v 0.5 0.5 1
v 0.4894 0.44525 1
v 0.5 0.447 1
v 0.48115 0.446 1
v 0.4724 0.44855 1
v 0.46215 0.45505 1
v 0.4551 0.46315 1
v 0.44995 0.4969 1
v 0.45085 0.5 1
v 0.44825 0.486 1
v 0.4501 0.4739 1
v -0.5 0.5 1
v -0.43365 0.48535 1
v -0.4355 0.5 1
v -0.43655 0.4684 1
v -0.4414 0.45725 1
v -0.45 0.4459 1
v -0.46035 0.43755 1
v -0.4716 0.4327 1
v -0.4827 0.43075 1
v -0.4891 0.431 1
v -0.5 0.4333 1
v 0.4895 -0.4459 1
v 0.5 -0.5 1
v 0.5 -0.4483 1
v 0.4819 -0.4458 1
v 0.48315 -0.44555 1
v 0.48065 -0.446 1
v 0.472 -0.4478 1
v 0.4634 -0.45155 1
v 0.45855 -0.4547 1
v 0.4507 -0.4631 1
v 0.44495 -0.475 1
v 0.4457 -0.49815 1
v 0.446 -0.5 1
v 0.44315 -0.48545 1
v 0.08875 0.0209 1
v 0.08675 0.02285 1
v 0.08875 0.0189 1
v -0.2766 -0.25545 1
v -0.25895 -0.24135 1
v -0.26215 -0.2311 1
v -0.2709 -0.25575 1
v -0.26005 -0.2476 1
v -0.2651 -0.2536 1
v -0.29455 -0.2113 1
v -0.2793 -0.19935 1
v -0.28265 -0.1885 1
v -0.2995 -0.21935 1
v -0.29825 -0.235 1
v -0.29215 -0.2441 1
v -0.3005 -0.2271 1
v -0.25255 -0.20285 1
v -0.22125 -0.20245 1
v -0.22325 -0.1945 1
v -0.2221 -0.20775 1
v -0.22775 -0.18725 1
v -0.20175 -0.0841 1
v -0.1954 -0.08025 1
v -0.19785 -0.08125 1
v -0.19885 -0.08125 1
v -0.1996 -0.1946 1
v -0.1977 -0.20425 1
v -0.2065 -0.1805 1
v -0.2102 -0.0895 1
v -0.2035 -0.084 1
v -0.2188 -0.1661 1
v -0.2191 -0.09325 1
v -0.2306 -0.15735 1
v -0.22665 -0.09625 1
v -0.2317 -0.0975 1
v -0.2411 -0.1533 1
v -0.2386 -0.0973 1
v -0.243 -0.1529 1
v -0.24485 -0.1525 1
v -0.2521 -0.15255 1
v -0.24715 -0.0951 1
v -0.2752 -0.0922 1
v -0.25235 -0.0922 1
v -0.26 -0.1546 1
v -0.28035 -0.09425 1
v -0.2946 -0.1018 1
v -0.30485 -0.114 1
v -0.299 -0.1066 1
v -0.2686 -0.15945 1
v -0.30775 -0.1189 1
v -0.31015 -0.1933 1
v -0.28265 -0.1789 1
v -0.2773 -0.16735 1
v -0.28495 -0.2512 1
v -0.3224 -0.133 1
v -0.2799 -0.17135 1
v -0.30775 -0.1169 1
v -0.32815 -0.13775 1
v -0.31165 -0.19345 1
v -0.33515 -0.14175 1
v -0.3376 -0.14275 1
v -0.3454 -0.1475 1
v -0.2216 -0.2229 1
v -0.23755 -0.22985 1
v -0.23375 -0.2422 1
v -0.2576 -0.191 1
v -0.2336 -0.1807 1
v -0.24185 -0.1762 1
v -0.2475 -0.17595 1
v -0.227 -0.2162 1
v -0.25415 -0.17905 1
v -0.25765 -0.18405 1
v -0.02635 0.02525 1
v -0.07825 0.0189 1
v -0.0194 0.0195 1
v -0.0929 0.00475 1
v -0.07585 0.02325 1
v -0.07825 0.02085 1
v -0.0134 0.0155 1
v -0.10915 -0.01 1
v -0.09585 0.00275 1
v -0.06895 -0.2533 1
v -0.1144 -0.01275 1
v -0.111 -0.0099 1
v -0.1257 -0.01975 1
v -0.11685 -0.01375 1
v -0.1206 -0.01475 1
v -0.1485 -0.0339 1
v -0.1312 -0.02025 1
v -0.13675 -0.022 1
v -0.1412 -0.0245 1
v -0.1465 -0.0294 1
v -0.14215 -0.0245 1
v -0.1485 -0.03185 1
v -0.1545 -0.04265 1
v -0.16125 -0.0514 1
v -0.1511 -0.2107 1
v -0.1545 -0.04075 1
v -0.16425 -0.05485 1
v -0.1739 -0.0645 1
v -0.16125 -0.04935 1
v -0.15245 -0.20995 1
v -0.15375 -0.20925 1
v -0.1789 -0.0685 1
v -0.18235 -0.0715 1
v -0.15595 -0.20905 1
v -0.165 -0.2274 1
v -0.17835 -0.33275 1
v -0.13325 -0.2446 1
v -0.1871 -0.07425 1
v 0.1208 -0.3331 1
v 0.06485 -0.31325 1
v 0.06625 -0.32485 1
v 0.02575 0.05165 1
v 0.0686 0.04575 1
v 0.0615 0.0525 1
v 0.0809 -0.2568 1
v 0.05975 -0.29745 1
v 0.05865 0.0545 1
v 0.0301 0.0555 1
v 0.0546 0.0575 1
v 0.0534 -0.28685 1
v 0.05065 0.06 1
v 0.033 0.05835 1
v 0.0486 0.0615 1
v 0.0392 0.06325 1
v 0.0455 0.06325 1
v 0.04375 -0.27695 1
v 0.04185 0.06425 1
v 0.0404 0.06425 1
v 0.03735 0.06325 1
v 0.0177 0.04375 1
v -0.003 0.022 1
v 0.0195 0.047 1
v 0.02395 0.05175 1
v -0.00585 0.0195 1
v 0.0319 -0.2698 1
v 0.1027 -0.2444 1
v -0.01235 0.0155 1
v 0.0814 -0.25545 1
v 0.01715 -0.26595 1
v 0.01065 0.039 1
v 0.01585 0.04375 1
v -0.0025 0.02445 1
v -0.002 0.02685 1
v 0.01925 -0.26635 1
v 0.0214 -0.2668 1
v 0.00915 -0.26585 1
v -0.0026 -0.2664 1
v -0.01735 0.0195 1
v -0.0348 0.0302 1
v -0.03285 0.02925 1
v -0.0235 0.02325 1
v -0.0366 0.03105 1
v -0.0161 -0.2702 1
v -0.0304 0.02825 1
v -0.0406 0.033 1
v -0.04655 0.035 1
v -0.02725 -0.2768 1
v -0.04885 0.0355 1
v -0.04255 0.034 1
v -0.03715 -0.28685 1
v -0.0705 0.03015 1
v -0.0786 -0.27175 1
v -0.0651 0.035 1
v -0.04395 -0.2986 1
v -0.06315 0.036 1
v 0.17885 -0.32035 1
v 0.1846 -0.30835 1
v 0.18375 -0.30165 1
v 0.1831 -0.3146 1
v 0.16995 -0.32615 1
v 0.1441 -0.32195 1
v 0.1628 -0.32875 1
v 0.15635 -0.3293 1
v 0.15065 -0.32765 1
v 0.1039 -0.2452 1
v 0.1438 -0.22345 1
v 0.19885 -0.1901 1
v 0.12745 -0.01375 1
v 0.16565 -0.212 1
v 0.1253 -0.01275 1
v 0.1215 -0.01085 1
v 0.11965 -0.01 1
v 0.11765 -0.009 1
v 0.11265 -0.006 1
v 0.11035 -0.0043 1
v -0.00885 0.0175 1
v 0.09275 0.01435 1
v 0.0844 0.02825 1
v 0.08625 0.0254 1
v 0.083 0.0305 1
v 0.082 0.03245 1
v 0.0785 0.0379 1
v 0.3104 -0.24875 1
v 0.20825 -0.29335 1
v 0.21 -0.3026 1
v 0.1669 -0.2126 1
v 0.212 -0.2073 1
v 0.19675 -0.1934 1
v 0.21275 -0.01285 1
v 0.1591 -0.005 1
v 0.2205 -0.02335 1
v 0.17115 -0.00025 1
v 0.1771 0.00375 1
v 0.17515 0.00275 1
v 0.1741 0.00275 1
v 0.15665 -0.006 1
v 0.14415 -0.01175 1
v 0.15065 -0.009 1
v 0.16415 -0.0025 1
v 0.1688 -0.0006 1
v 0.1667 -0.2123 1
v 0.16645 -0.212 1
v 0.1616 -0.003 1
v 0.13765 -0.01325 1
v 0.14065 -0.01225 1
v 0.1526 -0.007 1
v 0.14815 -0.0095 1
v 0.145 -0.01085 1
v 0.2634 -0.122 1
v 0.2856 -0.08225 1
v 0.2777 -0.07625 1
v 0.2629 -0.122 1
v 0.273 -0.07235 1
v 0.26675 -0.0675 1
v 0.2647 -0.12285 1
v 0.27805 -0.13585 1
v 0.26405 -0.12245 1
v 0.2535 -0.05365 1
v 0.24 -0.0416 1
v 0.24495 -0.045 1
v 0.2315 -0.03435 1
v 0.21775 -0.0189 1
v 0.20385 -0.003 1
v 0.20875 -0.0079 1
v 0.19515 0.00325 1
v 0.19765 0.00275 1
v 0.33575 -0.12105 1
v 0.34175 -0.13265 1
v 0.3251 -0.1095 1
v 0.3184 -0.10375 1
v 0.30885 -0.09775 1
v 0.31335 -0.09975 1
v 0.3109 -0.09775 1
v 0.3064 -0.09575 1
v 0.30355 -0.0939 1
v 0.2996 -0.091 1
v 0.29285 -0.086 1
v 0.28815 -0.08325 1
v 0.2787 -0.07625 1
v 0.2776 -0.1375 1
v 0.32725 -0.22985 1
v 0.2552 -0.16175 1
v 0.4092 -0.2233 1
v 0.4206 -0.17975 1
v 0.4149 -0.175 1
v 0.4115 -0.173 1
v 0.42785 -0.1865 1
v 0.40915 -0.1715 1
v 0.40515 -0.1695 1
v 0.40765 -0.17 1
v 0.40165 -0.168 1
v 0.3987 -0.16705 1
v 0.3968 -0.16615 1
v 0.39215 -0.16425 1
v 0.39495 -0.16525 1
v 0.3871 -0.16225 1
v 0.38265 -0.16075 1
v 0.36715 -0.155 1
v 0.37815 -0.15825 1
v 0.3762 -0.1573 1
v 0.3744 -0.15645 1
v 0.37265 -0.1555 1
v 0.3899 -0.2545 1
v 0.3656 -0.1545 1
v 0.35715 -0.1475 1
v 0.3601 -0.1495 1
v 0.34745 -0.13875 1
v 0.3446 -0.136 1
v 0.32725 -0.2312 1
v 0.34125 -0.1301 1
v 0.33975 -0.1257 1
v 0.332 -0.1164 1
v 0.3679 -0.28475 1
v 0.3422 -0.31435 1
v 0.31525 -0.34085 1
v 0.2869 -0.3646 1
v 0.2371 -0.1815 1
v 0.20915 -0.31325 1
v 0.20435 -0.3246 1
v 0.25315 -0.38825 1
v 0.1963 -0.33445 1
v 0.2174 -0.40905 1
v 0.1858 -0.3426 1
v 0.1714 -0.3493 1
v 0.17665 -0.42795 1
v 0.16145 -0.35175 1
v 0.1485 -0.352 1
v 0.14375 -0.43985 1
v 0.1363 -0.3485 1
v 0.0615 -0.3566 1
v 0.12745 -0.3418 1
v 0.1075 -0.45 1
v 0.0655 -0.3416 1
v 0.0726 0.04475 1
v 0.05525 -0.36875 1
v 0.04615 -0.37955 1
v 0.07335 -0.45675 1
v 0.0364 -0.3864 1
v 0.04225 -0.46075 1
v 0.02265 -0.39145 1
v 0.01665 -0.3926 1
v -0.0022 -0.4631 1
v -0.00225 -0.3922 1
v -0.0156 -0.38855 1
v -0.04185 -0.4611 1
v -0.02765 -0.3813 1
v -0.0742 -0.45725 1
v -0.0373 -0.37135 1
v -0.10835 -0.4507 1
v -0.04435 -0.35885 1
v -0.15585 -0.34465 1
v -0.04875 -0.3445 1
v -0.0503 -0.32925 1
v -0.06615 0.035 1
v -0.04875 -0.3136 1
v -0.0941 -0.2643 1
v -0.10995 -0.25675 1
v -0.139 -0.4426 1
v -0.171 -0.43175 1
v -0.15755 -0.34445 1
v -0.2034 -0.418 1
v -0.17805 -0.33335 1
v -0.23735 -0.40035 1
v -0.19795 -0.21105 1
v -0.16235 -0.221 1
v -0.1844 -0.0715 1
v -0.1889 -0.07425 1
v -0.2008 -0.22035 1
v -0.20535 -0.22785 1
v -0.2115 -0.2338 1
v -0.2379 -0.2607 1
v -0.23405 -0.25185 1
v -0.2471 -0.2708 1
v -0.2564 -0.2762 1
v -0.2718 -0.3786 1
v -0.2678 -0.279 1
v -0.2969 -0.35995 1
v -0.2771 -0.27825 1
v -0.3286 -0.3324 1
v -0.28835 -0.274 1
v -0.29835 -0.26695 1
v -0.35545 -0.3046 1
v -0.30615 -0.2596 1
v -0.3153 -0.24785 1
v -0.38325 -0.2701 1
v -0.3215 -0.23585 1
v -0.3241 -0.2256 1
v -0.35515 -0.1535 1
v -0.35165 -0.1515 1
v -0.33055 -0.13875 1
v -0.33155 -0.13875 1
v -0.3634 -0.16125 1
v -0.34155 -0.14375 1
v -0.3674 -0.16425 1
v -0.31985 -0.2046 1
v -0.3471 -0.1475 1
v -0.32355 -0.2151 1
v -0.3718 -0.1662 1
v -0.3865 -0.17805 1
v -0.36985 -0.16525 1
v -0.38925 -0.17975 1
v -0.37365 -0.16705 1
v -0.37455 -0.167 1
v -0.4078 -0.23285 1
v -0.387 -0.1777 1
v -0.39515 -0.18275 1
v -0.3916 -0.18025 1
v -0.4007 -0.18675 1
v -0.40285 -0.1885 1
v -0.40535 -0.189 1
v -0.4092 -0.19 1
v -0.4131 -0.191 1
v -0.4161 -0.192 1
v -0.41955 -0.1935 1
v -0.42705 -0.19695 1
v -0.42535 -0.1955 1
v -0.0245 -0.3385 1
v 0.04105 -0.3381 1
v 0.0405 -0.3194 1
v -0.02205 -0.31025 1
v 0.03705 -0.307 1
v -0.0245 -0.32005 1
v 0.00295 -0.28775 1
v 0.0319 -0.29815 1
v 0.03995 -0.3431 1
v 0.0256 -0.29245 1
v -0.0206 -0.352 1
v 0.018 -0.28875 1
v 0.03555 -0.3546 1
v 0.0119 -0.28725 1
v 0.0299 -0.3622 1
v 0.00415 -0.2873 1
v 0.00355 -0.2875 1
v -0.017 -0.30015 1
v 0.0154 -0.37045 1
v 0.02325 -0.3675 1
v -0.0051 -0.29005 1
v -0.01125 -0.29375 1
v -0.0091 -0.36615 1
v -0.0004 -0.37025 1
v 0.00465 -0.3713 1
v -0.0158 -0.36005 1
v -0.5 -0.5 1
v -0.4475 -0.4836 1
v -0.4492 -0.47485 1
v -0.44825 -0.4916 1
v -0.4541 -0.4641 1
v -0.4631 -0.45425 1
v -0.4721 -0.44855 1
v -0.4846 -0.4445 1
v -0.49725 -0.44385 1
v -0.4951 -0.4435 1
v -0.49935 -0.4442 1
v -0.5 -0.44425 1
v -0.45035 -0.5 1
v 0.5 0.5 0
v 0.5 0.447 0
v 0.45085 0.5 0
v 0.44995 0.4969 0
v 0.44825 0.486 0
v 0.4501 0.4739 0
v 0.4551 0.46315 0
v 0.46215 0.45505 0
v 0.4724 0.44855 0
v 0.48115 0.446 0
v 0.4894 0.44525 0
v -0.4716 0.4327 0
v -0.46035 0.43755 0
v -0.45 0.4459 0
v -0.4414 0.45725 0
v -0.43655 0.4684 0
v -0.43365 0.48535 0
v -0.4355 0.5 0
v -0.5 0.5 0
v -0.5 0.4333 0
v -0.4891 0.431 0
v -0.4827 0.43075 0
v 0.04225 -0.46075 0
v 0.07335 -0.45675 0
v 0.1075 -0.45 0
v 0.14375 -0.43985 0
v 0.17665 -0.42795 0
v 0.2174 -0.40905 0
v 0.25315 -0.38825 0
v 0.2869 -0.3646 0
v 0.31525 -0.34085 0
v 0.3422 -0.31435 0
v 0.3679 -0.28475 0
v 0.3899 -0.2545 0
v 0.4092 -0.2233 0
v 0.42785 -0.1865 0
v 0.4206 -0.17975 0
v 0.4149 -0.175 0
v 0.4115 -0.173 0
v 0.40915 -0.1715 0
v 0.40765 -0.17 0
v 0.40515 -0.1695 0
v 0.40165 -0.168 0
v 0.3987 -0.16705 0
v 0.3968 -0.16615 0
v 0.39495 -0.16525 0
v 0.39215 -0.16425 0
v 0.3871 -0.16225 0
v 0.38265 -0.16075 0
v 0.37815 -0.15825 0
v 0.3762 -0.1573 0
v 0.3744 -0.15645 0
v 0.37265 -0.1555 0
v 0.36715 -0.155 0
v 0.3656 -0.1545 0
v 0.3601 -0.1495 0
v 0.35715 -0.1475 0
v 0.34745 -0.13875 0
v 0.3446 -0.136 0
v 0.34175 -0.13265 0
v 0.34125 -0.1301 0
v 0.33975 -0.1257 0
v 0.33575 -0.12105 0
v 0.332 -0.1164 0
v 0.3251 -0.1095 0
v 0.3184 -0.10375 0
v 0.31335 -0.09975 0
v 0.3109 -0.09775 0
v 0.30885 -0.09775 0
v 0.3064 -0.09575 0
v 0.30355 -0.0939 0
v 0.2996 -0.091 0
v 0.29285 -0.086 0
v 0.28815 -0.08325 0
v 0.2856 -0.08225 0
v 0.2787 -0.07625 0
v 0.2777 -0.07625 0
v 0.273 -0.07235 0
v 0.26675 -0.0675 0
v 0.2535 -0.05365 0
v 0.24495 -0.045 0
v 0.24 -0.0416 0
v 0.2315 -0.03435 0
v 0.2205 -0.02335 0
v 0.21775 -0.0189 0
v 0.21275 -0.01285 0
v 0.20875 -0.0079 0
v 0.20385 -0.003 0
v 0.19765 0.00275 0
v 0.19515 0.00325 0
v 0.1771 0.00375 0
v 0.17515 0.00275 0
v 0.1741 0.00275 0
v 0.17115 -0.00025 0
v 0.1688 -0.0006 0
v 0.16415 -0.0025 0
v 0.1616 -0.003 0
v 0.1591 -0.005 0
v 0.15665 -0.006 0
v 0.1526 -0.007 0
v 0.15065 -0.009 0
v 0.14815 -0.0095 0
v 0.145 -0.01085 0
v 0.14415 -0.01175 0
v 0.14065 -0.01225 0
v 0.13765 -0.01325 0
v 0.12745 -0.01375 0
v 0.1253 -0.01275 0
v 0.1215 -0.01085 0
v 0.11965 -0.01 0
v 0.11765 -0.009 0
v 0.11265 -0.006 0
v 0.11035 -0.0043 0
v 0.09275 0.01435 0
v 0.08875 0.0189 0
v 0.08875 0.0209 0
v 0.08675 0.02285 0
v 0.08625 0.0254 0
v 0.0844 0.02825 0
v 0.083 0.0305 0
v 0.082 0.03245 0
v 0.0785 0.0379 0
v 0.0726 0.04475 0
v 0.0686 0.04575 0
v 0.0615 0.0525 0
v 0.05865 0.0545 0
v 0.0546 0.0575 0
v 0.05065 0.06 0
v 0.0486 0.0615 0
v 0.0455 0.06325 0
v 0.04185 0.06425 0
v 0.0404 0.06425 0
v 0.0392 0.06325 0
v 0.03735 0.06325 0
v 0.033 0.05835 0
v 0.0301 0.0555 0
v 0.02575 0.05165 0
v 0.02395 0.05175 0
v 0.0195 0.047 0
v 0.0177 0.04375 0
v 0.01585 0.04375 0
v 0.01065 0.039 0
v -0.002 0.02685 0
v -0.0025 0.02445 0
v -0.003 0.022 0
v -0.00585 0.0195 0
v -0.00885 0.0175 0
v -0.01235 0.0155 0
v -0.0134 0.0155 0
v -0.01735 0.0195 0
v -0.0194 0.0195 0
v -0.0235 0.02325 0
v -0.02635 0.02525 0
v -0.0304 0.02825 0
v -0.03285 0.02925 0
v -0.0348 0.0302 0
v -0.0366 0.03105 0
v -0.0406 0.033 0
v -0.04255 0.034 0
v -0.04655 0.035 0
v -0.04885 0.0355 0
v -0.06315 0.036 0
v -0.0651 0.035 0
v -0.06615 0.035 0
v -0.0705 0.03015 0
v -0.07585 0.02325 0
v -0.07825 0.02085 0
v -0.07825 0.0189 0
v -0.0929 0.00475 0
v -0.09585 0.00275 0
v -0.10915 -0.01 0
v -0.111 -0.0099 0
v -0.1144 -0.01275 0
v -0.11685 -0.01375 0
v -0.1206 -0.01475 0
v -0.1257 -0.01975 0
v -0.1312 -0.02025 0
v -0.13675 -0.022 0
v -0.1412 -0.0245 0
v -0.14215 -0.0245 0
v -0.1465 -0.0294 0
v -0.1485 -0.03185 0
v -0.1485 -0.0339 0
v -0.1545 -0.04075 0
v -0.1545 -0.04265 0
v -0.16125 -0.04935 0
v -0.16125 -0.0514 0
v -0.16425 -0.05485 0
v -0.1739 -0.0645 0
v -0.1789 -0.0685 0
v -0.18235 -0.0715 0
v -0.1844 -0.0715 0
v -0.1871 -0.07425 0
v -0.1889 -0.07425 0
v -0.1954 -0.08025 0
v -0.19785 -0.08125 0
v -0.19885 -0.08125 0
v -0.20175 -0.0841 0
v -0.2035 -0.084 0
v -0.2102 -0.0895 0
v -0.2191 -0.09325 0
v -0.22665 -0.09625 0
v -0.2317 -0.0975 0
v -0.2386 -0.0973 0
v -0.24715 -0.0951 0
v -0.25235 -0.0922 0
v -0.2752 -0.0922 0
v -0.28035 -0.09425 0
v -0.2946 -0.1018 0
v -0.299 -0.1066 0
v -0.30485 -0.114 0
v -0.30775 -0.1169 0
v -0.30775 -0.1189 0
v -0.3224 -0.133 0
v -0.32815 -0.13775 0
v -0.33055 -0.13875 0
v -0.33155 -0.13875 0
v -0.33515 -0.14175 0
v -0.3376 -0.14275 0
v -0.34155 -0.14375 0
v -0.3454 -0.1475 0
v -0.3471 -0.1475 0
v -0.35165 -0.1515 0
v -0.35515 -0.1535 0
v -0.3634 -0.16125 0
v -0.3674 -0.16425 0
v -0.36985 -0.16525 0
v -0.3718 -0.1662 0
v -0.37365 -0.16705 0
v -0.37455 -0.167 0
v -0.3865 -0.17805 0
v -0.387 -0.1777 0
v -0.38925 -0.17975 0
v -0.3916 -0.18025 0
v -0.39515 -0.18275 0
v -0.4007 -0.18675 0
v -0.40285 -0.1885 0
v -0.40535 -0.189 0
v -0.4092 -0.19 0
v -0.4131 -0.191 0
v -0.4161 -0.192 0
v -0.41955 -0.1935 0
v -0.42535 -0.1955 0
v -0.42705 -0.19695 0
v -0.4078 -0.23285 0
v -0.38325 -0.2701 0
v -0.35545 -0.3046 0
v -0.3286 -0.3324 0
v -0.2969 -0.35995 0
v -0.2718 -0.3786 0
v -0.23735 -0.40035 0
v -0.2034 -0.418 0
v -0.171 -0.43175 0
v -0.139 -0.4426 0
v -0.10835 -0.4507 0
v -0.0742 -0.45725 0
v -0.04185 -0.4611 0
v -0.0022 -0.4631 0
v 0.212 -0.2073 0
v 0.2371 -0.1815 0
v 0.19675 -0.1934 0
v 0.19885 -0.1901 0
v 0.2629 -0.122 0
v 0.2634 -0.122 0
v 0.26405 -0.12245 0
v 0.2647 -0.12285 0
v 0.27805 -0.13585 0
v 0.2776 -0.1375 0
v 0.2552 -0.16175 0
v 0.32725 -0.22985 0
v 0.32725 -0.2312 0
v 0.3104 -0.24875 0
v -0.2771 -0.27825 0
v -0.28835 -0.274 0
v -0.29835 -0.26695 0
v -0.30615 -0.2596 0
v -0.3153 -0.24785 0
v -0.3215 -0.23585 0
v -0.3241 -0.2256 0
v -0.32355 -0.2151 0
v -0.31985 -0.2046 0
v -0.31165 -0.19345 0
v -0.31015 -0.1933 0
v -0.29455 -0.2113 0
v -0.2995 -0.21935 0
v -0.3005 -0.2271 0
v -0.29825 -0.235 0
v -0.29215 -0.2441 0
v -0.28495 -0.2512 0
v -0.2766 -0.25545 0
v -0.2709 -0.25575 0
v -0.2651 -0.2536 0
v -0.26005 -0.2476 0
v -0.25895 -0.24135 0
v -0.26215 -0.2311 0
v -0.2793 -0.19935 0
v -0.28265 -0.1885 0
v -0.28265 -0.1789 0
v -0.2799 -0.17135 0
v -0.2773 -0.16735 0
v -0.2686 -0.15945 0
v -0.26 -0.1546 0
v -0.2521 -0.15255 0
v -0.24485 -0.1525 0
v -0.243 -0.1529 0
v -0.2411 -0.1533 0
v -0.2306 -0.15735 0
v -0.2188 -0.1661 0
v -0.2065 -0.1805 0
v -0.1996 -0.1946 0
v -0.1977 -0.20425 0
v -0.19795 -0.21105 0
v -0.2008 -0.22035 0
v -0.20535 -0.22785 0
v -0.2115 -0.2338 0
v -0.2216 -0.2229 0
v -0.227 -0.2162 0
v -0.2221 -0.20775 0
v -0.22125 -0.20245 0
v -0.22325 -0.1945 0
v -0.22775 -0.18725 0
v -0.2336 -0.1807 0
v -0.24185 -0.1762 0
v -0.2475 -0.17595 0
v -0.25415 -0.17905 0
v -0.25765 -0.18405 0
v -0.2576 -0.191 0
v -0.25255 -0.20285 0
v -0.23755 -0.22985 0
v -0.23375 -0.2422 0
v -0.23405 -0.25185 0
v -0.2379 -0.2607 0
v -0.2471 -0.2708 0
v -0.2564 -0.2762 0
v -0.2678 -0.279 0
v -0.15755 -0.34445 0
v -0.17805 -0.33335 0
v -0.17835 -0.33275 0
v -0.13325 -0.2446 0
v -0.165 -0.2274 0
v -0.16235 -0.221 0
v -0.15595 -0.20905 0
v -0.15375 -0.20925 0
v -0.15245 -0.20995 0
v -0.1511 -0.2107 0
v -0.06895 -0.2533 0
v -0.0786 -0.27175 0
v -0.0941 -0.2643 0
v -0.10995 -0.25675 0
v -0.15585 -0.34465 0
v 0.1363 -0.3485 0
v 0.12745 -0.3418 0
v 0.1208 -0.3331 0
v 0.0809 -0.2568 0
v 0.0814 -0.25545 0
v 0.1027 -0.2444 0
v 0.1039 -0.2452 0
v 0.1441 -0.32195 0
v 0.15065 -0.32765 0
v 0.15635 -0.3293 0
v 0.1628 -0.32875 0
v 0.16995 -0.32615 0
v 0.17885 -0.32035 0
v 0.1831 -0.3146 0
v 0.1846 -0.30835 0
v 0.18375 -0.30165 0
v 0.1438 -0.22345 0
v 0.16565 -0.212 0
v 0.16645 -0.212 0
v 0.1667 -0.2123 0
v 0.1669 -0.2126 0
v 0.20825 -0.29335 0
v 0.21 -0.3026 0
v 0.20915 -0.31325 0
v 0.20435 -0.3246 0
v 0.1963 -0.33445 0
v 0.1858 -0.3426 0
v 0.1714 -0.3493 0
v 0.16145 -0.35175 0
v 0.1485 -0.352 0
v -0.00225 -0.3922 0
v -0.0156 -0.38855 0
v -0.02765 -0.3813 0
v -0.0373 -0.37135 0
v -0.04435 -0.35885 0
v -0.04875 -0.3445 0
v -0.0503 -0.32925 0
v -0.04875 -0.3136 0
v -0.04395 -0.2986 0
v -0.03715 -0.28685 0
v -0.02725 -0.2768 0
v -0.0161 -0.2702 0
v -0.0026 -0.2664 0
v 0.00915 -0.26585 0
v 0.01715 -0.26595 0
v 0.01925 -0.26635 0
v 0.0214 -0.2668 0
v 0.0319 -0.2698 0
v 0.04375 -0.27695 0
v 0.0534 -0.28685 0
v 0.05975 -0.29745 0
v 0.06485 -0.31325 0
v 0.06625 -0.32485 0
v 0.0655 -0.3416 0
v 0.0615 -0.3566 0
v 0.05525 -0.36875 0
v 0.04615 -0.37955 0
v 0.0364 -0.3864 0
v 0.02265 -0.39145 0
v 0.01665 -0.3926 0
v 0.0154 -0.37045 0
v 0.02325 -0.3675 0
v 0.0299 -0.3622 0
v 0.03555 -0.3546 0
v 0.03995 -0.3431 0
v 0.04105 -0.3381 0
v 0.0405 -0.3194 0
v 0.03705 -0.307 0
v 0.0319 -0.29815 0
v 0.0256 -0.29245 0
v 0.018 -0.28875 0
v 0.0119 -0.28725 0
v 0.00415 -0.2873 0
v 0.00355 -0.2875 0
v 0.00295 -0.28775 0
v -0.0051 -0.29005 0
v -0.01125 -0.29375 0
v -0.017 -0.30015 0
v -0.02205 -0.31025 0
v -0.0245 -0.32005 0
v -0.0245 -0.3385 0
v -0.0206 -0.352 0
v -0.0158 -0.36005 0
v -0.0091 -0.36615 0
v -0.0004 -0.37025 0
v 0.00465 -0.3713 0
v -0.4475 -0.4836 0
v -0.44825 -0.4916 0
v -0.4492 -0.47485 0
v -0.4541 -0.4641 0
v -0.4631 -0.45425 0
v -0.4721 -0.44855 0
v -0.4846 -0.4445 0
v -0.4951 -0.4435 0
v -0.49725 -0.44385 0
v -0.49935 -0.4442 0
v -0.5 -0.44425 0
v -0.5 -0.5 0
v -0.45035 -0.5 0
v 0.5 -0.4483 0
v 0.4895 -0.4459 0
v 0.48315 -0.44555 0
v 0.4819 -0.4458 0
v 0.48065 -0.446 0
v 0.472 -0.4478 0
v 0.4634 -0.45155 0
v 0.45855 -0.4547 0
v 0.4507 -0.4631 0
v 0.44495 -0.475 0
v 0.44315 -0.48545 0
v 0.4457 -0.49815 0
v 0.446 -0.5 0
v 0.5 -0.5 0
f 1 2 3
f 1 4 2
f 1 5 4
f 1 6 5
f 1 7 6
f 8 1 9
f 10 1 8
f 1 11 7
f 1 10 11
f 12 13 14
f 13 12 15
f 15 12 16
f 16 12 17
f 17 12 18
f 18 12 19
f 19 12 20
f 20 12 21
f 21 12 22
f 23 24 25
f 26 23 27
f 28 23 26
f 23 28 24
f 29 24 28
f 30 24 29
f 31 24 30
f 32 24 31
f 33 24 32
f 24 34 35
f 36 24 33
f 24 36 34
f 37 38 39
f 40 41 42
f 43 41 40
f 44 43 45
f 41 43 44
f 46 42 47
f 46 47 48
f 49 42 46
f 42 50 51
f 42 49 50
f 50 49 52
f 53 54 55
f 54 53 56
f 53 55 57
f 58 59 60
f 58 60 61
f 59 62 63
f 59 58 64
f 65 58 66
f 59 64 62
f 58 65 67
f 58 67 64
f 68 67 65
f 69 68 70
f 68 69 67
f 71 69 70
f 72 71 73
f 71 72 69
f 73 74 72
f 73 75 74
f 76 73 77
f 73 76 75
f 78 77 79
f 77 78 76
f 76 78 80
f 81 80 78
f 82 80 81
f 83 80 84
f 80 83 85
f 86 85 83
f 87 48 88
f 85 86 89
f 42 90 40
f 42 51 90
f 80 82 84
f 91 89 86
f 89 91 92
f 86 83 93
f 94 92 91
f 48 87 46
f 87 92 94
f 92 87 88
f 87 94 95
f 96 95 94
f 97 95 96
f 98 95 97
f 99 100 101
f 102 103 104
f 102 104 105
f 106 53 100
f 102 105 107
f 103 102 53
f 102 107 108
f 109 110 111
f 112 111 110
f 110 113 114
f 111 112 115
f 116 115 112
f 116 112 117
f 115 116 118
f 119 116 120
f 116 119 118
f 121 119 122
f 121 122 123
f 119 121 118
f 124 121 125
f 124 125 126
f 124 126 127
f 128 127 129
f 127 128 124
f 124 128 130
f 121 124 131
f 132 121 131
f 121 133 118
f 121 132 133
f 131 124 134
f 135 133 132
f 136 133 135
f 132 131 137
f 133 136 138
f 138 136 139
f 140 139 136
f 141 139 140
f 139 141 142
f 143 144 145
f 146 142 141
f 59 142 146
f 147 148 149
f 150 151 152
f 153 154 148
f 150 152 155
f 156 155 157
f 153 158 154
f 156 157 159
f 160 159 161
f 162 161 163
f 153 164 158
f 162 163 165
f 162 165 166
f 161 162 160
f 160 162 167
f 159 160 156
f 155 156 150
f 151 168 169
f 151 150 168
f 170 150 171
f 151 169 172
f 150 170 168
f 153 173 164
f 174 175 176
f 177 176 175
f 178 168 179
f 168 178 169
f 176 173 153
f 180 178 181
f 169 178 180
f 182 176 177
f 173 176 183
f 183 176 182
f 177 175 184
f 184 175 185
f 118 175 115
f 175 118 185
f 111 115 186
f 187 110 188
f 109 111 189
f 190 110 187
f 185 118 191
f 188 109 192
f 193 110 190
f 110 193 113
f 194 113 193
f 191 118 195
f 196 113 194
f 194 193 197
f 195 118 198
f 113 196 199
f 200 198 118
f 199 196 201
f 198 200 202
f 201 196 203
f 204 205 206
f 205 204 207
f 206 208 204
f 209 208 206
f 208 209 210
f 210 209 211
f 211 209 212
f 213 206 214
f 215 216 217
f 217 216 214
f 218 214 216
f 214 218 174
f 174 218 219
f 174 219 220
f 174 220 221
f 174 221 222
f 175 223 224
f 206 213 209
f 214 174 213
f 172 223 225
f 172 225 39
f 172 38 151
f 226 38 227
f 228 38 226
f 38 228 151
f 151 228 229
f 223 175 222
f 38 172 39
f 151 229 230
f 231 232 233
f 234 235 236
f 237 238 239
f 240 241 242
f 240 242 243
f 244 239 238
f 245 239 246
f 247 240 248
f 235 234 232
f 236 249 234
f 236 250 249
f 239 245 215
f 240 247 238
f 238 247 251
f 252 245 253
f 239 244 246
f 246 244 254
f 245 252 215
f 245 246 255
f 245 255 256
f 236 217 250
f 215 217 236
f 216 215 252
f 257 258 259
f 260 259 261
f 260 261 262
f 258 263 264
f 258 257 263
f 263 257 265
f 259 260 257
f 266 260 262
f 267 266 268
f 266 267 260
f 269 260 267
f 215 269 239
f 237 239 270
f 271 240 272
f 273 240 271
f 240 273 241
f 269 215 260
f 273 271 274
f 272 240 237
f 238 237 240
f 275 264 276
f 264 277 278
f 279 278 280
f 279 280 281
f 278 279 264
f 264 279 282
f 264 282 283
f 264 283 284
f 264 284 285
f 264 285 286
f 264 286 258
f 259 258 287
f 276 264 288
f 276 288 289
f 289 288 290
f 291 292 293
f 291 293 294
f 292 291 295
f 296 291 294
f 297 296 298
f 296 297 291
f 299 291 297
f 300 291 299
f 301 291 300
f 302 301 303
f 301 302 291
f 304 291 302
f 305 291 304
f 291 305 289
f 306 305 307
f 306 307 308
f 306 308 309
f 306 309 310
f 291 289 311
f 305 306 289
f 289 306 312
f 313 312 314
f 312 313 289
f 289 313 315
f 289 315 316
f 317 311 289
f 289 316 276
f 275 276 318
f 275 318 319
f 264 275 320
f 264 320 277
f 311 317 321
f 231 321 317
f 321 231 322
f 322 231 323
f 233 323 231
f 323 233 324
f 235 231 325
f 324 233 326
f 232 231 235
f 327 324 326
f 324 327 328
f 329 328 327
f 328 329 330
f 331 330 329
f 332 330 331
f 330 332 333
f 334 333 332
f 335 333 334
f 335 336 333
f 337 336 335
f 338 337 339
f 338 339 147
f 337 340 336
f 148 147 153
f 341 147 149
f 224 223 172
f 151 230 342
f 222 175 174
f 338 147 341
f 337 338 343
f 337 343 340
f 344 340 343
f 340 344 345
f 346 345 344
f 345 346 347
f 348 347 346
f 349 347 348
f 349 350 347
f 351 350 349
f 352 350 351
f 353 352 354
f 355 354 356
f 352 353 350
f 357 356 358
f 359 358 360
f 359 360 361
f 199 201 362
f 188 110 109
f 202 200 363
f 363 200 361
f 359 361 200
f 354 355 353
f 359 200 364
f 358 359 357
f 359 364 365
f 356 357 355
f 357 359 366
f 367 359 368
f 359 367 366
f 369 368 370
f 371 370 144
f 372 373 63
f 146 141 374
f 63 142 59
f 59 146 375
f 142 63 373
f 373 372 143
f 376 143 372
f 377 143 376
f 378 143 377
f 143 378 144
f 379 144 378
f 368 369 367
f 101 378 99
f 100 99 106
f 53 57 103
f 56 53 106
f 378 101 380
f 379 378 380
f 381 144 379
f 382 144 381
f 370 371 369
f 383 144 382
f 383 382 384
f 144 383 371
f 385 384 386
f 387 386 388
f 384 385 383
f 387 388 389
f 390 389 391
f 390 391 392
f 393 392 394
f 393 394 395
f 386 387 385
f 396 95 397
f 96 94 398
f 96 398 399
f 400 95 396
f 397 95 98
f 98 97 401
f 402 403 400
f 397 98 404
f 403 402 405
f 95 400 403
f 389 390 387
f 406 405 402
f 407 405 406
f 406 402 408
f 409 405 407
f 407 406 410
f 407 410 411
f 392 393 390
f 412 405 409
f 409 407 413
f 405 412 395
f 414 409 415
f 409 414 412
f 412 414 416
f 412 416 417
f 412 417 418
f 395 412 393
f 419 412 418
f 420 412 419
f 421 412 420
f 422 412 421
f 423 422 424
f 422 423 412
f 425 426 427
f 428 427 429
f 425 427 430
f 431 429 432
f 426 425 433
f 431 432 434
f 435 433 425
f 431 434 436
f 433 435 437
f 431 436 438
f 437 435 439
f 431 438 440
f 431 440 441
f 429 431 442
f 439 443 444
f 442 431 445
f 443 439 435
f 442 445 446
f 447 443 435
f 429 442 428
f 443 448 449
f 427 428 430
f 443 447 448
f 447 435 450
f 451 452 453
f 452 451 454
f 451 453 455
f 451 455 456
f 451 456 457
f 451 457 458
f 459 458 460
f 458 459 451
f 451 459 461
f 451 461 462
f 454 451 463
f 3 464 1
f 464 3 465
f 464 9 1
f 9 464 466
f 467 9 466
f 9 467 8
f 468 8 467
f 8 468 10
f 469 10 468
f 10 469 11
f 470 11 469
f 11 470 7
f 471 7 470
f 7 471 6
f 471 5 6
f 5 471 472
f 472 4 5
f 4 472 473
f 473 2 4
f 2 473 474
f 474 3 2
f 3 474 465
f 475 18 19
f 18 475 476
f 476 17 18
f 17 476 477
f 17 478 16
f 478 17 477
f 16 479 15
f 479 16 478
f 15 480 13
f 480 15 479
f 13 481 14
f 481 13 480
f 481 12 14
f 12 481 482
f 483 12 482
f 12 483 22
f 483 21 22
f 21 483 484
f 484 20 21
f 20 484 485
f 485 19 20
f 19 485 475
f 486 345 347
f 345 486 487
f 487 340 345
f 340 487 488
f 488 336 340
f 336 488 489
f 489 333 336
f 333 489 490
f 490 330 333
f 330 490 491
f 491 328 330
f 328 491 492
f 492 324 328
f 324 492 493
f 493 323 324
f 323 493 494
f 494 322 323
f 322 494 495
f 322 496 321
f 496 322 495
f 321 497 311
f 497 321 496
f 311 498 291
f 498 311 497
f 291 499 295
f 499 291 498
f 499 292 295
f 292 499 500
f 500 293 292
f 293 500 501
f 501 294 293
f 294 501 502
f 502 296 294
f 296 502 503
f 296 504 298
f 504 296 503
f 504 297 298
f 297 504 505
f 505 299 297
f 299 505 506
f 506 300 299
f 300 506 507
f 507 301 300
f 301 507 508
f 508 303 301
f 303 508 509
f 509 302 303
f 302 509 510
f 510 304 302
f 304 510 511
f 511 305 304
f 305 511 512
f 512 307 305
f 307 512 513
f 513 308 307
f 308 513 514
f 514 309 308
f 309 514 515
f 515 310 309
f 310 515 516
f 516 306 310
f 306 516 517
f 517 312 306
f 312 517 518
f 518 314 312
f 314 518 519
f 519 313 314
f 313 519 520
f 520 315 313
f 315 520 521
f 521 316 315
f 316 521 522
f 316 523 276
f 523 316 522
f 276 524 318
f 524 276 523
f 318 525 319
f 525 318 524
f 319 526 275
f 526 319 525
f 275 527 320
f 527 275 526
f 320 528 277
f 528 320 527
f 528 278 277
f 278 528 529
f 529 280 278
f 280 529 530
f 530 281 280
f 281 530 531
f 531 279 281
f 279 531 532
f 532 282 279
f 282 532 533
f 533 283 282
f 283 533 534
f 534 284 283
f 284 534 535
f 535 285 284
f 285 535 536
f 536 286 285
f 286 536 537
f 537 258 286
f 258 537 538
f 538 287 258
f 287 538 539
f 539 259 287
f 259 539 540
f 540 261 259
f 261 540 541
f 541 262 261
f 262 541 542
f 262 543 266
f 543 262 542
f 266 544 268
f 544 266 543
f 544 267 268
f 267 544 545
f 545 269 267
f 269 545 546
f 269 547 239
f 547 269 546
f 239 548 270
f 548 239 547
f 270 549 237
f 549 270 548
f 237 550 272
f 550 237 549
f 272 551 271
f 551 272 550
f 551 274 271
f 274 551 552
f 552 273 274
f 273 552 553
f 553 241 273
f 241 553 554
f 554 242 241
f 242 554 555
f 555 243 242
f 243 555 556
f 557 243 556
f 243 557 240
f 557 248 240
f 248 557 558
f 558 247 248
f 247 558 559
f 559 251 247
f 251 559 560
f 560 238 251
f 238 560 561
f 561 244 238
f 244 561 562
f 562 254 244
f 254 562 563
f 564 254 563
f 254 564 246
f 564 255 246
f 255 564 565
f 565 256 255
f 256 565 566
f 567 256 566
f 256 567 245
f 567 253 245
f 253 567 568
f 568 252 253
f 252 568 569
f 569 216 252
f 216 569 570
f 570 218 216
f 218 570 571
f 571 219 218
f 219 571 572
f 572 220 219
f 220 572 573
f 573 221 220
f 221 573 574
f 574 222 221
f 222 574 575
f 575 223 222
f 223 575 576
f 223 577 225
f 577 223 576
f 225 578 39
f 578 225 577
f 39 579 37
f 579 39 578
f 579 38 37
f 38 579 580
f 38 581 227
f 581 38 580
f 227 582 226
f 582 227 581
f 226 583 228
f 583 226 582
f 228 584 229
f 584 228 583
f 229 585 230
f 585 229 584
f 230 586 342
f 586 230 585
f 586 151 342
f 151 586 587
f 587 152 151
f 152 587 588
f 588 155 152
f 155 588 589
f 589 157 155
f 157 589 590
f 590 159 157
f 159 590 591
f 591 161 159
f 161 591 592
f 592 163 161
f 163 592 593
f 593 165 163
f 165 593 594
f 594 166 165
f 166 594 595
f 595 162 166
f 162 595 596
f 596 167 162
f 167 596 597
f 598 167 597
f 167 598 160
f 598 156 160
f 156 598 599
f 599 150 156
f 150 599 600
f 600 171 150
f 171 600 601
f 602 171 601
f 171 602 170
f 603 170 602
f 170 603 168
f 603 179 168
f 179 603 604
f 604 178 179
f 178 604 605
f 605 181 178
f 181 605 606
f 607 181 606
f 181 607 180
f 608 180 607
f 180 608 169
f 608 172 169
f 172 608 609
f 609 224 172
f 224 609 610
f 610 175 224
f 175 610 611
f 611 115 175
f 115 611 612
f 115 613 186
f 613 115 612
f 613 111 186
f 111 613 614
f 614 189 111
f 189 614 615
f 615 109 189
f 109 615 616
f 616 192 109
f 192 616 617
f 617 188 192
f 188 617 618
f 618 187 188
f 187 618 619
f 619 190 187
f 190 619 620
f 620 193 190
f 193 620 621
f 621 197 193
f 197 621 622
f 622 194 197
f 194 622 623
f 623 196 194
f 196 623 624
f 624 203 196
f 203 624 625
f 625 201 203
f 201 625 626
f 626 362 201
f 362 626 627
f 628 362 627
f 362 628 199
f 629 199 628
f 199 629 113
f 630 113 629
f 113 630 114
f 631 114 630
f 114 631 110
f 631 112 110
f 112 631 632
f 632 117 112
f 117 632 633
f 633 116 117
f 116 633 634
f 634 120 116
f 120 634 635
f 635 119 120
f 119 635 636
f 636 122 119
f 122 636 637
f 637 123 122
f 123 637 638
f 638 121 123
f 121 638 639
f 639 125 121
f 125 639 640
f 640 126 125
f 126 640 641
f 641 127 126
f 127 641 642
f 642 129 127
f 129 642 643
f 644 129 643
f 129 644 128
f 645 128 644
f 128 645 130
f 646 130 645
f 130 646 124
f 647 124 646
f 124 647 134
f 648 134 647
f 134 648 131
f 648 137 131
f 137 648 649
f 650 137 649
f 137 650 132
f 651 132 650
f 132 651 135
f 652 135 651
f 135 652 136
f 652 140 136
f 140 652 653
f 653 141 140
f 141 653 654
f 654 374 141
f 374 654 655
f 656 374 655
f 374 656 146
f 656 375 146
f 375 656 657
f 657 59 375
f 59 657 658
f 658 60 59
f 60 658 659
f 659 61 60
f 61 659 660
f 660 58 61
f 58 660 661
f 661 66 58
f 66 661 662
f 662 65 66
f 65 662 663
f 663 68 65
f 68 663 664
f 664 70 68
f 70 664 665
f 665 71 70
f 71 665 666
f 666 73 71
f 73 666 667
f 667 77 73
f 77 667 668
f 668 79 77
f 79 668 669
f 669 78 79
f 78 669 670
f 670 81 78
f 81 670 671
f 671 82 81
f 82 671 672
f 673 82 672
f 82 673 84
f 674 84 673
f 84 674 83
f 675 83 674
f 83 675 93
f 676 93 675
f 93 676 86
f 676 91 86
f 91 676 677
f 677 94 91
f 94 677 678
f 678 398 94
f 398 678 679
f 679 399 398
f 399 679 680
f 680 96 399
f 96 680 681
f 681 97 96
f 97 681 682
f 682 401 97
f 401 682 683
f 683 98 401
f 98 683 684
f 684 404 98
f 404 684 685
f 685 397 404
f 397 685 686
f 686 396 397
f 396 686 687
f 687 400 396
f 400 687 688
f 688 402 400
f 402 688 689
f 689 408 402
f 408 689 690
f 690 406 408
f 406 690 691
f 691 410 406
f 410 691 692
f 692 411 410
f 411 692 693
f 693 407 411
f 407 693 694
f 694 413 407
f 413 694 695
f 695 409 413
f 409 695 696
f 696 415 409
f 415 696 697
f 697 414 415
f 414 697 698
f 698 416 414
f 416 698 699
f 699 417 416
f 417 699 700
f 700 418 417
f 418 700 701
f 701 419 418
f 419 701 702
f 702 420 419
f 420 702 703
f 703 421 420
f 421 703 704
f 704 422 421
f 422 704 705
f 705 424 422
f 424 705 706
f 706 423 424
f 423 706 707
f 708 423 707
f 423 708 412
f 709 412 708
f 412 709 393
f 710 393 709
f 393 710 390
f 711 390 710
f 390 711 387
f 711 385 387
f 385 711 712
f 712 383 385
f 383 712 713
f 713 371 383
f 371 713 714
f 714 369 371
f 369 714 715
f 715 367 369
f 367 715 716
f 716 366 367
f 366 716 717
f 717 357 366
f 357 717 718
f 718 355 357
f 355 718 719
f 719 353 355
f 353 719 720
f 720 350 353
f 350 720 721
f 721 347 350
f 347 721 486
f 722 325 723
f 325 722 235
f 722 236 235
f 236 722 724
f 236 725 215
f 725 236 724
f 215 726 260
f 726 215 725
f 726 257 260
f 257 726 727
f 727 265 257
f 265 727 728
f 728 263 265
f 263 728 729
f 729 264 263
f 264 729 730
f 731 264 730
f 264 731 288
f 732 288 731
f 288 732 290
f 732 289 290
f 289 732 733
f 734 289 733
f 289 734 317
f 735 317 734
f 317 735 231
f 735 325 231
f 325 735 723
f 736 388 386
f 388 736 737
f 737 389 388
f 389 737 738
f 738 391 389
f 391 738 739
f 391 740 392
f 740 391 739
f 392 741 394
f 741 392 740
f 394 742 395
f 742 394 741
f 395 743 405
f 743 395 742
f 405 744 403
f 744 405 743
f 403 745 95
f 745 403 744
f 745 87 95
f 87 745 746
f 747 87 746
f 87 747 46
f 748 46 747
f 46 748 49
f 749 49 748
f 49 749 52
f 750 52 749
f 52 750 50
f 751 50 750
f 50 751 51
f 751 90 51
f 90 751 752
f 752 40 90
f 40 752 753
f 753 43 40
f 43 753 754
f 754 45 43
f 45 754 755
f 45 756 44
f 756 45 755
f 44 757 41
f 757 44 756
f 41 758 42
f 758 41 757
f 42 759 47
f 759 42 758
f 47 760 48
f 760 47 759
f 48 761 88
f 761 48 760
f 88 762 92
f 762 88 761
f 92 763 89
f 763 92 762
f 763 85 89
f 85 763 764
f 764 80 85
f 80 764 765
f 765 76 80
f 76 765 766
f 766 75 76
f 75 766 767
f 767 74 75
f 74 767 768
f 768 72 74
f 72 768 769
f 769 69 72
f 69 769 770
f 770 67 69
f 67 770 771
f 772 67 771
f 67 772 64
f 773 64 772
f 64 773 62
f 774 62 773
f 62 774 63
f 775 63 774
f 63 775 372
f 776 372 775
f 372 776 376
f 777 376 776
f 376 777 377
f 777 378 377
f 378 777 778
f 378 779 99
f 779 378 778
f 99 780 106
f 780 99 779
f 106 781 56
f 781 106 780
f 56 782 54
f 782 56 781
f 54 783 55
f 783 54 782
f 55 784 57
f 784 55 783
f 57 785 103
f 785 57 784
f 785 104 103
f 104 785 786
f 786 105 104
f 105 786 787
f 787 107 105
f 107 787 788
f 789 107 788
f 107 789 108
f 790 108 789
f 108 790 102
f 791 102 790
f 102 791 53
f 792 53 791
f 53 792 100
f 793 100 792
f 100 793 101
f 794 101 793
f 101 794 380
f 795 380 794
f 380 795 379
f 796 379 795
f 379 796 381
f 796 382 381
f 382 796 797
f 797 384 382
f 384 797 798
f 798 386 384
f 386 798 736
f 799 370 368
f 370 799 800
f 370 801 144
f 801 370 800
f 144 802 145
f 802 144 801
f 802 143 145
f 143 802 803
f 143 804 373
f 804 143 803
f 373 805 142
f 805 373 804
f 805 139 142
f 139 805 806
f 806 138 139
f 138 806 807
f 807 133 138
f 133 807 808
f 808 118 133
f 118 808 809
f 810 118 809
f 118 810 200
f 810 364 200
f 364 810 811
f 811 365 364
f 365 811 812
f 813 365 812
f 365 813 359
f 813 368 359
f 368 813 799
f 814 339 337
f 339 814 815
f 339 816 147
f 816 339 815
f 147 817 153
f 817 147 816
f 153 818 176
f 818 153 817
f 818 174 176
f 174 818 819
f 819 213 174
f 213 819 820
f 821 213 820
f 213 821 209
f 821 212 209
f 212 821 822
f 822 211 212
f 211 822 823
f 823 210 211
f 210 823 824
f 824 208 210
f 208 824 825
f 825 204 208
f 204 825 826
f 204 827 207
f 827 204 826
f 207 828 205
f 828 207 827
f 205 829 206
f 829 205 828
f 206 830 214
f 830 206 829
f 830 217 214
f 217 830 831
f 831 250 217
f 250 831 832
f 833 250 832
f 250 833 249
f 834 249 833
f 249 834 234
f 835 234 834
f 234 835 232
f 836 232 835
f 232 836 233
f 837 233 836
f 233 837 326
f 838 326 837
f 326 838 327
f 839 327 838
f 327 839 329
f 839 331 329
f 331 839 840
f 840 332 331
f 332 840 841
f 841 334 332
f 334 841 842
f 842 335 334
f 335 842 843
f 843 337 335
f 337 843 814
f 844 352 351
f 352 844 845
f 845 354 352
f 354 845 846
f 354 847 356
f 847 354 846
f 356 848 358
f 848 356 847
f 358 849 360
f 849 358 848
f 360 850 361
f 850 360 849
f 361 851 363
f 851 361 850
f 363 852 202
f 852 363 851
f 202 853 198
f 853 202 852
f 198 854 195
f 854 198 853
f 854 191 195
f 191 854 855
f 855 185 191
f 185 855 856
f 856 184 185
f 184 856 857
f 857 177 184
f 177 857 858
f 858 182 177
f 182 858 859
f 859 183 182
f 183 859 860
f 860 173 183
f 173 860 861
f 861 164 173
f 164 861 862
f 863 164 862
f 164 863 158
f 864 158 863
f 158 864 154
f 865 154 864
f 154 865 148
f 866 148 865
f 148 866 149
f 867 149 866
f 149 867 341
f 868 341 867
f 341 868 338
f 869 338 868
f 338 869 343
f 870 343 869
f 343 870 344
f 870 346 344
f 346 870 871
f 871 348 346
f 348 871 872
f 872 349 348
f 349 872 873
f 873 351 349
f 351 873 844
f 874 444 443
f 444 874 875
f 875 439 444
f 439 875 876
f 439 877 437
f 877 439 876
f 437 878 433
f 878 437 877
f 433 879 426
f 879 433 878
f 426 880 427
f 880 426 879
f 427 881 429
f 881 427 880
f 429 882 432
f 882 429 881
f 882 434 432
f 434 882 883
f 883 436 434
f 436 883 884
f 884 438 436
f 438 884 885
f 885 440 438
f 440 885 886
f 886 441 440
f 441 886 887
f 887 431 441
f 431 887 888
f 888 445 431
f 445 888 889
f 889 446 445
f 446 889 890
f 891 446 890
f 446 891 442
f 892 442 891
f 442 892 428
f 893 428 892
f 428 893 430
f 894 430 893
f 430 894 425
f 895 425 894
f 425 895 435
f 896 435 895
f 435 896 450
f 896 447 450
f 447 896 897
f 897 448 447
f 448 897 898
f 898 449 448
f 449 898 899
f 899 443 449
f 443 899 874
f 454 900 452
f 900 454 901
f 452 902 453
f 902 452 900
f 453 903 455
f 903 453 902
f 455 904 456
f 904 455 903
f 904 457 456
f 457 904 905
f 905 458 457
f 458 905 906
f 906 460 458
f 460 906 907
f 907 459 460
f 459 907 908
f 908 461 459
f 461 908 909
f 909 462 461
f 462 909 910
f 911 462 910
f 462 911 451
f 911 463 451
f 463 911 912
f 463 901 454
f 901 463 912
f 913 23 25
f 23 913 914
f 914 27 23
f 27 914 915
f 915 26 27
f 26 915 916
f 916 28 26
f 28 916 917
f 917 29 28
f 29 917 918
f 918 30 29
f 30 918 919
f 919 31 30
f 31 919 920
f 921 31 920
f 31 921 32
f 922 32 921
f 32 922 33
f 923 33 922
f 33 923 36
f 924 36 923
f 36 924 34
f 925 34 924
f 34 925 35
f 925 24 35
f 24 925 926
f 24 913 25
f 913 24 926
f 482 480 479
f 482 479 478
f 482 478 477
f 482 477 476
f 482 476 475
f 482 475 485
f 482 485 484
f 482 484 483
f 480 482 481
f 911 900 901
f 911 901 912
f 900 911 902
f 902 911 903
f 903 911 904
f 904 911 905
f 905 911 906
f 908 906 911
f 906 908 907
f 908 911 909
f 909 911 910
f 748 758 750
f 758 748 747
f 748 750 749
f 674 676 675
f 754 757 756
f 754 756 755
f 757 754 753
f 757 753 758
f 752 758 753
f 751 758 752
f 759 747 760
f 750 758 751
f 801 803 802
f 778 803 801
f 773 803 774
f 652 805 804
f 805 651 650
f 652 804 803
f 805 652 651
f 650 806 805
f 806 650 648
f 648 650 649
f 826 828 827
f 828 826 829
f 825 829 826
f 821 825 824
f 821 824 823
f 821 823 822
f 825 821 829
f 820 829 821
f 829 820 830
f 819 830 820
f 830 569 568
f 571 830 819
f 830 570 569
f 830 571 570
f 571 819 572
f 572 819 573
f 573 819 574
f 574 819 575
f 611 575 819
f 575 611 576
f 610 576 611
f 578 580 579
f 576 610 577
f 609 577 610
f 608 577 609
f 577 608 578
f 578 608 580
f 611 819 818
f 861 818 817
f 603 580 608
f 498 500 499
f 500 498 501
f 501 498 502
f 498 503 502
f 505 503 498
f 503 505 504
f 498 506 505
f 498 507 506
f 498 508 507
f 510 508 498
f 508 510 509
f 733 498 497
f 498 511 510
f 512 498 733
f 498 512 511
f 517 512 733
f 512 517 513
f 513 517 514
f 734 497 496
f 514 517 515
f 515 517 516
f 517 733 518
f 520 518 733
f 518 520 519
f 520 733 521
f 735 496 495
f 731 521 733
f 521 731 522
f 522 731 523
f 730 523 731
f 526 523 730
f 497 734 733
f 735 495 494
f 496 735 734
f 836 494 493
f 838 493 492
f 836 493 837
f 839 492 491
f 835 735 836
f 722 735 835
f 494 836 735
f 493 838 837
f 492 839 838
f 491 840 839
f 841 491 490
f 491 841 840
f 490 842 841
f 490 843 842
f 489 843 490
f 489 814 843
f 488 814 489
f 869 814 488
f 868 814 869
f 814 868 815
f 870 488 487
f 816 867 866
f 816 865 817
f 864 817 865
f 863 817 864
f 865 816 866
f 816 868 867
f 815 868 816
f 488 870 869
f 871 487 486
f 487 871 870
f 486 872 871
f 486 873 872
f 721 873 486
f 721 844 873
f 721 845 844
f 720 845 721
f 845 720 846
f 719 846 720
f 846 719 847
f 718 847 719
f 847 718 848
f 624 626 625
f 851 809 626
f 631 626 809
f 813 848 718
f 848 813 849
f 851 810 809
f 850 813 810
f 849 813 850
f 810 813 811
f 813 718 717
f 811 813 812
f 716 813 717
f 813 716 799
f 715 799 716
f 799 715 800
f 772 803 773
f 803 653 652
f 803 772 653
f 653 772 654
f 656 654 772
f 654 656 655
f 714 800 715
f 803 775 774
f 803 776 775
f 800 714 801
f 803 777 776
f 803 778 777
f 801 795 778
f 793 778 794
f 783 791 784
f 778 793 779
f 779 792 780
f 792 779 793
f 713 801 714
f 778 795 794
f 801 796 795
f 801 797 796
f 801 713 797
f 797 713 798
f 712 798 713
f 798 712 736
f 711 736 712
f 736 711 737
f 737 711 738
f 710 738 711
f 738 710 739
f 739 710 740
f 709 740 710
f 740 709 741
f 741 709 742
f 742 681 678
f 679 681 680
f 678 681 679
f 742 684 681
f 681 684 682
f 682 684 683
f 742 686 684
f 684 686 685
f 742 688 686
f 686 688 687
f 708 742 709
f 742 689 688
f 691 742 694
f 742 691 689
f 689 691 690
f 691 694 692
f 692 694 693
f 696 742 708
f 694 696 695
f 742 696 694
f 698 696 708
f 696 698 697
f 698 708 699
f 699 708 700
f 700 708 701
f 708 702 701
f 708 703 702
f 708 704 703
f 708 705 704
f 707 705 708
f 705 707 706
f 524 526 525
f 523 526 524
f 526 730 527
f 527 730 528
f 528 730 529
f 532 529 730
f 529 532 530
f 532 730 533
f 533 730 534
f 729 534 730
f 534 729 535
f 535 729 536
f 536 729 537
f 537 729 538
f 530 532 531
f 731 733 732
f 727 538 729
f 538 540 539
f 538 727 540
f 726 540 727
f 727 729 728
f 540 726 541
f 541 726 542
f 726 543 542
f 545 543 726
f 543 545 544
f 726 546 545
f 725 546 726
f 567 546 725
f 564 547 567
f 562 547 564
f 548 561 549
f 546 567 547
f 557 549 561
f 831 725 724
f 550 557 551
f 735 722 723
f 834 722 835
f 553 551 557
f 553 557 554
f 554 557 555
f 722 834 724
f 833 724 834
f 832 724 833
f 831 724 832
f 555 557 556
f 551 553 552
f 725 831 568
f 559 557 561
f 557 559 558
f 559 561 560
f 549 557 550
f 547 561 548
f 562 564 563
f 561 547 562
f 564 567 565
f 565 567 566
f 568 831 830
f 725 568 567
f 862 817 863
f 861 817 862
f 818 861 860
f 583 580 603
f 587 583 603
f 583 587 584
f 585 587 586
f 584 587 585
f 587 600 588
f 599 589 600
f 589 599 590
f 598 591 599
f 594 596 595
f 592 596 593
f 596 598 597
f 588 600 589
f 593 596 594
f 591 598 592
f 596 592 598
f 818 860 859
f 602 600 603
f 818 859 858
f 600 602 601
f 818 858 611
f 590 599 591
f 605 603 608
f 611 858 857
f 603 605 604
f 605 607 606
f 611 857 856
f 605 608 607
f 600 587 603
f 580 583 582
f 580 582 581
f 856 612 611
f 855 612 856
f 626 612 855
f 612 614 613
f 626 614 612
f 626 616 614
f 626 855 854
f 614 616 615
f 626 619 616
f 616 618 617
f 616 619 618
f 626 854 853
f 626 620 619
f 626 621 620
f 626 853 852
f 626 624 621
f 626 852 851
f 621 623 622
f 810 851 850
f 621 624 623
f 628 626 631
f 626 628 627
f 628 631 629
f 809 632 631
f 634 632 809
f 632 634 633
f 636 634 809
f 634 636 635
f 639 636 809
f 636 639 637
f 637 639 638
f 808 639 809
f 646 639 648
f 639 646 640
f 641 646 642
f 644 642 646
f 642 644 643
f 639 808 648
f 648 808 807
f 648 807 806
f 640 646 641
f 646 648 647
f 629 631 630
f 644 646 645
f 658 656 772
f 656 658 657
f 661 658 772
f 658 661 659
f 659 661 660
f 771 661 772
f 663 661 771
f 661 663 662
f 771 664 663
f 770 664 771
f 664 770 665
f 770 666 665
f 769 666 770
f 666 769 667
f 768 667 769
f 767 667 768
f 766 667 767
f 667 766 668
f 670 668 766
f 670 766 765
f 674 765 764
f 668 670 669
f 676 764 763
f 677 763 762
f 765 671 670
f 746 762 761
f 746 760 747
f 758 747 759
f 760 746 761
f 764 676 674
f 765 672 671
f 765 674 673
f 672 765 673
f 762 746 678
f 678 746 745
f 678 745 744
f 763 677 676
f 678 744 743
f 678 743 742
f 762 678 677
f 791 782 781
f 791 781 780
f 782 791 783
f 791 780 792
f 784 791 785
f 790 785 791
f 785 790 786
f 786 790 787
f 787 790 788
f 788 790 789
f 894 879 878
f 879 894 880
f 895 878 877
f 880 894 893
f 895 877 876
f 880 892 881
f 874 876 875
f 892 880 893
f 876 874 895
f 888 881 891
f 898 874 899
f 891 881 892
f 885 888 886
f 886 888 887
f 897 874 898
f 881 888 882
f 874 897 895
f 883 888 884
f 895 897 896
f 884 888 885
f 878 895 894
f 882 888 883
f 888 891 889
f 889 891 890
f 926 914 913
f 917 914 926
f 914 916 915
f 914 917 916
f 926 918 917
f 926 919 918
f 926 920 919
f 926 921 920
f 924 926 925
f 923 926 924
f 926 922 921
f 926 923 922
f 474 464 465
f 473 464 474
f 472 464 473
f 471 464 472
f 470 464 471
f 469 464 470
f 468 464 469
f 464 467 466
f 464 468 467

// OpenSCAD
module mcGreen4_1()
{
 /* Generated by trace2scad version 20150415
    http://aggregate.org/MAKE/TRACE2SCAD/
    Optimized model has 466/2541 original points
 */
 color([0.5, 0.5, 0.5])
 assign(minx=0) /* polygon minx=0 */
 assign(miny=0) /* polygon miny=0 */
 assign(maxx=20000) /* polygon maxx=20000 */
 assign(maxy=20000) /* polygon maxy=20000 */
 assign(dx=maxx-minx)
 assign(dy=maxy-miny)
 assign(maxd=((dx>dy)?dx:dy))
 scale([1/maxd, 1/maxd, 1])
 translate([-minx-dx/2, -miny-dy/2, 0])
 linear_extrude(height=1, convexity=466)
 union() {
  union() {
   polygon([[0,19333],[0,18666],[218,18620],[346,18615],[568,18654],[793,18751],[1000,18918],[1172,19145],[1269,19368],[1327,19707],[1290,20000],[0,20000]], convexity=5);
   polygon([[19008,19969],[18999,19938],[18965,19720],[19002,19478],[19102,19263],[19243,19101],[19448,18971],[19623,18920],[19788,18905],[20000,18940],[20000,20000],[19017,20000]], convexity=6);
   union() {
    difference() {
     polygon([[10796,11275],[10784,11265],[10747,11265],[10660,11167],[10602,11110],[10515,11033],[10479,11035],[10390,10940],[10354,10875],[10317,10875],[10213,10780],[9960,10537],[9950,10489],[9940,10440],[9883,10390],[9823,10350],[9753,10310],[9732,10310],[9653,10390],[9612,10390],[9530,10465],[9473,10505],[9392,10565],[9343,10585],[9304,10604],[9268,10621],[9188,10660],[9149,10680],[9069,10700],[9023,10710],[8737,10720],[8698,10700],[8677,10700],[8590,10603],[8483,10465],[8435,10417],[8435,10378],[8142,10095],[8083,10055],[7817,9800],[7780,9802],[7712,9745],[7663,9725],[7588,9705],[7486,9605],[7376,9595],[7265,9560],[7176,9510],[7157,9510],[7070,9412],[7030,9363],[7030,9322],[6910,9185],[6910,9147],[6775,9013],[6775,8972],[6715,8903],[6522,8710],[6422,8630],[6353,8570],[6312,8570],[6258,8515],[6222,8515],[6092,8395],[6043,8375],[6023,8375],[5965,8318],[5930,8320],[5796,8210],[5618,8135],[5467,8075],[5366,8050],[5228,8054],[5057,8098],[4953,8156],[4496,8156],[4393,8115],[4108,7964],[4020,7868],[3903,7720],[3845,7662],[3845,7622],[3552,7340],[3437,7245],[3389,7225],[3369,7225],[3297,7165],[3248,7145],[3169,7125],[3092,7050],[3058,7050],[2967,6970],[2897,6930],[2732,6775],[2652,6715],[2603,6695],[2564,6676],[2527,6659],[2509,6660],[2270,6439],[2260,6446],[2215,6405],[2168,6395],[2097,6345],[1986,6265],[1943,6230],[1893,6220],[1816,6200],[1738,6180],[1678,6160],[1609,6130],[1493,6090],[1459,6061],[1844,5343],[2335,4598],[2891,3908],[3428,3352],[4062,2801],[4564,2428],[5253,1993],[5932,1640],[6580,1365],[7220,1148],[7833,986],[8516,855],[9163,778],[9956,738],[10845,785],[11467,865],[12150,1000],[12875,1203],[13533,1441],[14348,1819],[15063,2235],[15738,2708],[16305,3183],[16844,3713],[17358,4305],[17798,4910],[18184,5534],[18557,6270],[18412,6405],[18298,6500],[18230,6540],[18183,6570],[18153,6600],[18103,6610],[18033,6640],[17974,6659],[17936,6677],[17899,6695],[17843,6715],[17742,6755],[17653,6785],[17563,6835],[17524,6854],[17488,6871],[17453,6890],[17343,6900],[17312,6910],[17202,7010],[17143,7050],[16949,7225],[16892,7280],[16835,7347],[16825,7398],[16795,7486],[16715,7579],[16640,7672],[16502,7810],[16368,7925],[16267,8005],[16218,8045],[16177,8045],[16128,8085],[16071,8122],[15992,8180],[15857,8280],[15763,8335],[15712,8355],[15574,8475],[15554,8475],[15460,8553],[15335,8650],[15070,8927],[14899,9100],[14800,9168],[14630,9313],[14410,9533],[14355,9622],[14255,9743],[14175,9842],[14077,9940],[13953,10055],[13903,10065],[13542,10075],[13503,10055],[13482,10055],[13423,9995],[13376,9988],[13283,9950],[13232,9940],[13182,9900],[13133,9880],[13052,9860],[13013,9820],[12963,9810],[12900,9783],[12883,9765],[12813,9755],[12753,9735],[12549,9725],[12506,9745],[12430,9783],[12393,9800],[12353,9820],[12253,9880],[12207,9914],[11855,10287],[11775,10378],[11775,10418],[11735,10457],[11725,10508],[11688,10565],[11660,10610],[11640,10649],[11570,10758],[11452,10895],[11372,10915],[11230,11050],[11173,11090],[11092,11150],[11013,11200],[10972,11230],[10910,11265],[10837,11285],[10808,11285]], convexity=54);
     polygon([[15281,7551],[15294,7543],[15561,7283],[15552,7250],[15104,6765],[16545,5403],[16545,5376],[16208,5025],[14742,6370],[14240,5854],[13935,6132],[13977,6198],[15258,7560],[15268,7560]], convexity=10);
     polygon([[5140,6942],[5178,6934],[5388,6853],[5624,6678],[5870,6390],[6008,6108],[6046,5915],[6041,5779],[5984,5593],[5893,5443],[5770,5324],[5568,5542],[5460,5676],[5558,5845],[5575,5951],[5535,6110],[5445,6255],[5328,6386],[5163,6476],[5050,6481],[4917,6419],[4847,6319],[4848,6180],[4949,5943],[5249,5403],[5325,5156],[5319,4963],[5242,4786],[5058,4584],[4872,4476],[4644,4420],[4458,4435],[4233,4520],[4033,4661],[3877,4808],[3694,5043],[3570,5283],[3518,5488],[3529,5698],[3603,5908],[3767,6131],[3797,6134],[4109,5774],[4010,5613],[3990,5458],[4035,5300],[4157,5118],[4301,4976],[4468,4891],[4582,4885],[4698,4928],[4799,5048],[4821,5173],[4757,5378],[4414,6013],[4347,6230],[4347,6422],[4402,6573],[4454,6653],[4628,6811],[4800,6908],[4958,6949],[5103,6950]], convexity=18);
     polygon([[6951,5801],[6978,5786],[8621,4934],[8428,4565],[8118,4714],[7801,4865],[6883,3107],[6849,3111],[6439,3333],[6433,3345],[7335,5108],[6700,5452],[6753,5580],[6881,5819],[6925,5815]], convexity=11);
     polygon([[13334,5754],[13338,5748],[14165,4133],[14200,3948],[14183,3735],[14087,3508],[13926,3311],[13716,3148],[13428,3014],[13229,2965],[12970,2960],[12726,3030],[12549,3164],[12416,3338],[11618,4864],[11628,4891],[12054,5112],[12078,5096],[12882,3561],[13013,3447],[13127,3414],[13256,3425],[13399,3477],[13577,3593],[13662,3708],[13692,3833],[13675,3967],[12876,5531],[13313,5760],[13329,5760]], convexity=10);
     polygon([[10385,4673],[10428,4664],[10638,4604],[10875,4461],[11068,4263],[11195,4051],[11297,3735],[11325,3503],[11310,3168],[11230,2868],[11105,2625],[10923,2409],[10728,2272],[10453,2171],[10333,2148],[9955,2156],[9688,2229],[9447,2374],[9254,2573],[9113,2823],[9025,3110],[8994,3415],[9025,3728],[9121,4028],[9257,4263],[9455,4464],[9678,4596],[9948,4672],[10183,4683],[10343,4681]], convexity=7);
    }
    polygon([[10071,4250],[10059,4245],[9898,4199],[9775,4125],[9660,3997],[9559,3795],[9510,3599],[9510,3230],[9588,2960],[9684,2799],[9818,2677],[9992,2595],[10093,2574],[10308,2591],[10465,2650],[10598,2756],[10711,2908],[10799,3138],[10821,3238],[10810,3612],[10741,3860],[10638,4037],[10512,4151],[10360,4225],[10238,4255],[10083,4254]], convexity=7);
   }
   polygon([[55,1123],[13,1116],[0,1115],[0,0],[993,0],[1035,168],[1050,328],[1016,503],[918,718],[738,915],[558,1029],[308,1110],[98,1130]], convexity=6);
   polygon([[19638,1084],[19613,1080],[19440,1044],[19268,969],[19171,906],[19014,738],[18899,500],[18863,291],[18914,37],[18920,0],[20000,0],[20000,1034],[19790,1082],[19663,1089]], convexity=6);
  }
 }
}

module mcGreen4()
{
 /* all layers combined, scaled to within a 1mm cube */
 scale([1, 1, 1/1])
 difference() {
  union() {
   scale([1,1,2]) translate([0,0,-0.5]) mcGreen4_1();
  }
  translate([0,0,-2]) cube([2,2,4],center=true);
 }
}
mcGreen4();
